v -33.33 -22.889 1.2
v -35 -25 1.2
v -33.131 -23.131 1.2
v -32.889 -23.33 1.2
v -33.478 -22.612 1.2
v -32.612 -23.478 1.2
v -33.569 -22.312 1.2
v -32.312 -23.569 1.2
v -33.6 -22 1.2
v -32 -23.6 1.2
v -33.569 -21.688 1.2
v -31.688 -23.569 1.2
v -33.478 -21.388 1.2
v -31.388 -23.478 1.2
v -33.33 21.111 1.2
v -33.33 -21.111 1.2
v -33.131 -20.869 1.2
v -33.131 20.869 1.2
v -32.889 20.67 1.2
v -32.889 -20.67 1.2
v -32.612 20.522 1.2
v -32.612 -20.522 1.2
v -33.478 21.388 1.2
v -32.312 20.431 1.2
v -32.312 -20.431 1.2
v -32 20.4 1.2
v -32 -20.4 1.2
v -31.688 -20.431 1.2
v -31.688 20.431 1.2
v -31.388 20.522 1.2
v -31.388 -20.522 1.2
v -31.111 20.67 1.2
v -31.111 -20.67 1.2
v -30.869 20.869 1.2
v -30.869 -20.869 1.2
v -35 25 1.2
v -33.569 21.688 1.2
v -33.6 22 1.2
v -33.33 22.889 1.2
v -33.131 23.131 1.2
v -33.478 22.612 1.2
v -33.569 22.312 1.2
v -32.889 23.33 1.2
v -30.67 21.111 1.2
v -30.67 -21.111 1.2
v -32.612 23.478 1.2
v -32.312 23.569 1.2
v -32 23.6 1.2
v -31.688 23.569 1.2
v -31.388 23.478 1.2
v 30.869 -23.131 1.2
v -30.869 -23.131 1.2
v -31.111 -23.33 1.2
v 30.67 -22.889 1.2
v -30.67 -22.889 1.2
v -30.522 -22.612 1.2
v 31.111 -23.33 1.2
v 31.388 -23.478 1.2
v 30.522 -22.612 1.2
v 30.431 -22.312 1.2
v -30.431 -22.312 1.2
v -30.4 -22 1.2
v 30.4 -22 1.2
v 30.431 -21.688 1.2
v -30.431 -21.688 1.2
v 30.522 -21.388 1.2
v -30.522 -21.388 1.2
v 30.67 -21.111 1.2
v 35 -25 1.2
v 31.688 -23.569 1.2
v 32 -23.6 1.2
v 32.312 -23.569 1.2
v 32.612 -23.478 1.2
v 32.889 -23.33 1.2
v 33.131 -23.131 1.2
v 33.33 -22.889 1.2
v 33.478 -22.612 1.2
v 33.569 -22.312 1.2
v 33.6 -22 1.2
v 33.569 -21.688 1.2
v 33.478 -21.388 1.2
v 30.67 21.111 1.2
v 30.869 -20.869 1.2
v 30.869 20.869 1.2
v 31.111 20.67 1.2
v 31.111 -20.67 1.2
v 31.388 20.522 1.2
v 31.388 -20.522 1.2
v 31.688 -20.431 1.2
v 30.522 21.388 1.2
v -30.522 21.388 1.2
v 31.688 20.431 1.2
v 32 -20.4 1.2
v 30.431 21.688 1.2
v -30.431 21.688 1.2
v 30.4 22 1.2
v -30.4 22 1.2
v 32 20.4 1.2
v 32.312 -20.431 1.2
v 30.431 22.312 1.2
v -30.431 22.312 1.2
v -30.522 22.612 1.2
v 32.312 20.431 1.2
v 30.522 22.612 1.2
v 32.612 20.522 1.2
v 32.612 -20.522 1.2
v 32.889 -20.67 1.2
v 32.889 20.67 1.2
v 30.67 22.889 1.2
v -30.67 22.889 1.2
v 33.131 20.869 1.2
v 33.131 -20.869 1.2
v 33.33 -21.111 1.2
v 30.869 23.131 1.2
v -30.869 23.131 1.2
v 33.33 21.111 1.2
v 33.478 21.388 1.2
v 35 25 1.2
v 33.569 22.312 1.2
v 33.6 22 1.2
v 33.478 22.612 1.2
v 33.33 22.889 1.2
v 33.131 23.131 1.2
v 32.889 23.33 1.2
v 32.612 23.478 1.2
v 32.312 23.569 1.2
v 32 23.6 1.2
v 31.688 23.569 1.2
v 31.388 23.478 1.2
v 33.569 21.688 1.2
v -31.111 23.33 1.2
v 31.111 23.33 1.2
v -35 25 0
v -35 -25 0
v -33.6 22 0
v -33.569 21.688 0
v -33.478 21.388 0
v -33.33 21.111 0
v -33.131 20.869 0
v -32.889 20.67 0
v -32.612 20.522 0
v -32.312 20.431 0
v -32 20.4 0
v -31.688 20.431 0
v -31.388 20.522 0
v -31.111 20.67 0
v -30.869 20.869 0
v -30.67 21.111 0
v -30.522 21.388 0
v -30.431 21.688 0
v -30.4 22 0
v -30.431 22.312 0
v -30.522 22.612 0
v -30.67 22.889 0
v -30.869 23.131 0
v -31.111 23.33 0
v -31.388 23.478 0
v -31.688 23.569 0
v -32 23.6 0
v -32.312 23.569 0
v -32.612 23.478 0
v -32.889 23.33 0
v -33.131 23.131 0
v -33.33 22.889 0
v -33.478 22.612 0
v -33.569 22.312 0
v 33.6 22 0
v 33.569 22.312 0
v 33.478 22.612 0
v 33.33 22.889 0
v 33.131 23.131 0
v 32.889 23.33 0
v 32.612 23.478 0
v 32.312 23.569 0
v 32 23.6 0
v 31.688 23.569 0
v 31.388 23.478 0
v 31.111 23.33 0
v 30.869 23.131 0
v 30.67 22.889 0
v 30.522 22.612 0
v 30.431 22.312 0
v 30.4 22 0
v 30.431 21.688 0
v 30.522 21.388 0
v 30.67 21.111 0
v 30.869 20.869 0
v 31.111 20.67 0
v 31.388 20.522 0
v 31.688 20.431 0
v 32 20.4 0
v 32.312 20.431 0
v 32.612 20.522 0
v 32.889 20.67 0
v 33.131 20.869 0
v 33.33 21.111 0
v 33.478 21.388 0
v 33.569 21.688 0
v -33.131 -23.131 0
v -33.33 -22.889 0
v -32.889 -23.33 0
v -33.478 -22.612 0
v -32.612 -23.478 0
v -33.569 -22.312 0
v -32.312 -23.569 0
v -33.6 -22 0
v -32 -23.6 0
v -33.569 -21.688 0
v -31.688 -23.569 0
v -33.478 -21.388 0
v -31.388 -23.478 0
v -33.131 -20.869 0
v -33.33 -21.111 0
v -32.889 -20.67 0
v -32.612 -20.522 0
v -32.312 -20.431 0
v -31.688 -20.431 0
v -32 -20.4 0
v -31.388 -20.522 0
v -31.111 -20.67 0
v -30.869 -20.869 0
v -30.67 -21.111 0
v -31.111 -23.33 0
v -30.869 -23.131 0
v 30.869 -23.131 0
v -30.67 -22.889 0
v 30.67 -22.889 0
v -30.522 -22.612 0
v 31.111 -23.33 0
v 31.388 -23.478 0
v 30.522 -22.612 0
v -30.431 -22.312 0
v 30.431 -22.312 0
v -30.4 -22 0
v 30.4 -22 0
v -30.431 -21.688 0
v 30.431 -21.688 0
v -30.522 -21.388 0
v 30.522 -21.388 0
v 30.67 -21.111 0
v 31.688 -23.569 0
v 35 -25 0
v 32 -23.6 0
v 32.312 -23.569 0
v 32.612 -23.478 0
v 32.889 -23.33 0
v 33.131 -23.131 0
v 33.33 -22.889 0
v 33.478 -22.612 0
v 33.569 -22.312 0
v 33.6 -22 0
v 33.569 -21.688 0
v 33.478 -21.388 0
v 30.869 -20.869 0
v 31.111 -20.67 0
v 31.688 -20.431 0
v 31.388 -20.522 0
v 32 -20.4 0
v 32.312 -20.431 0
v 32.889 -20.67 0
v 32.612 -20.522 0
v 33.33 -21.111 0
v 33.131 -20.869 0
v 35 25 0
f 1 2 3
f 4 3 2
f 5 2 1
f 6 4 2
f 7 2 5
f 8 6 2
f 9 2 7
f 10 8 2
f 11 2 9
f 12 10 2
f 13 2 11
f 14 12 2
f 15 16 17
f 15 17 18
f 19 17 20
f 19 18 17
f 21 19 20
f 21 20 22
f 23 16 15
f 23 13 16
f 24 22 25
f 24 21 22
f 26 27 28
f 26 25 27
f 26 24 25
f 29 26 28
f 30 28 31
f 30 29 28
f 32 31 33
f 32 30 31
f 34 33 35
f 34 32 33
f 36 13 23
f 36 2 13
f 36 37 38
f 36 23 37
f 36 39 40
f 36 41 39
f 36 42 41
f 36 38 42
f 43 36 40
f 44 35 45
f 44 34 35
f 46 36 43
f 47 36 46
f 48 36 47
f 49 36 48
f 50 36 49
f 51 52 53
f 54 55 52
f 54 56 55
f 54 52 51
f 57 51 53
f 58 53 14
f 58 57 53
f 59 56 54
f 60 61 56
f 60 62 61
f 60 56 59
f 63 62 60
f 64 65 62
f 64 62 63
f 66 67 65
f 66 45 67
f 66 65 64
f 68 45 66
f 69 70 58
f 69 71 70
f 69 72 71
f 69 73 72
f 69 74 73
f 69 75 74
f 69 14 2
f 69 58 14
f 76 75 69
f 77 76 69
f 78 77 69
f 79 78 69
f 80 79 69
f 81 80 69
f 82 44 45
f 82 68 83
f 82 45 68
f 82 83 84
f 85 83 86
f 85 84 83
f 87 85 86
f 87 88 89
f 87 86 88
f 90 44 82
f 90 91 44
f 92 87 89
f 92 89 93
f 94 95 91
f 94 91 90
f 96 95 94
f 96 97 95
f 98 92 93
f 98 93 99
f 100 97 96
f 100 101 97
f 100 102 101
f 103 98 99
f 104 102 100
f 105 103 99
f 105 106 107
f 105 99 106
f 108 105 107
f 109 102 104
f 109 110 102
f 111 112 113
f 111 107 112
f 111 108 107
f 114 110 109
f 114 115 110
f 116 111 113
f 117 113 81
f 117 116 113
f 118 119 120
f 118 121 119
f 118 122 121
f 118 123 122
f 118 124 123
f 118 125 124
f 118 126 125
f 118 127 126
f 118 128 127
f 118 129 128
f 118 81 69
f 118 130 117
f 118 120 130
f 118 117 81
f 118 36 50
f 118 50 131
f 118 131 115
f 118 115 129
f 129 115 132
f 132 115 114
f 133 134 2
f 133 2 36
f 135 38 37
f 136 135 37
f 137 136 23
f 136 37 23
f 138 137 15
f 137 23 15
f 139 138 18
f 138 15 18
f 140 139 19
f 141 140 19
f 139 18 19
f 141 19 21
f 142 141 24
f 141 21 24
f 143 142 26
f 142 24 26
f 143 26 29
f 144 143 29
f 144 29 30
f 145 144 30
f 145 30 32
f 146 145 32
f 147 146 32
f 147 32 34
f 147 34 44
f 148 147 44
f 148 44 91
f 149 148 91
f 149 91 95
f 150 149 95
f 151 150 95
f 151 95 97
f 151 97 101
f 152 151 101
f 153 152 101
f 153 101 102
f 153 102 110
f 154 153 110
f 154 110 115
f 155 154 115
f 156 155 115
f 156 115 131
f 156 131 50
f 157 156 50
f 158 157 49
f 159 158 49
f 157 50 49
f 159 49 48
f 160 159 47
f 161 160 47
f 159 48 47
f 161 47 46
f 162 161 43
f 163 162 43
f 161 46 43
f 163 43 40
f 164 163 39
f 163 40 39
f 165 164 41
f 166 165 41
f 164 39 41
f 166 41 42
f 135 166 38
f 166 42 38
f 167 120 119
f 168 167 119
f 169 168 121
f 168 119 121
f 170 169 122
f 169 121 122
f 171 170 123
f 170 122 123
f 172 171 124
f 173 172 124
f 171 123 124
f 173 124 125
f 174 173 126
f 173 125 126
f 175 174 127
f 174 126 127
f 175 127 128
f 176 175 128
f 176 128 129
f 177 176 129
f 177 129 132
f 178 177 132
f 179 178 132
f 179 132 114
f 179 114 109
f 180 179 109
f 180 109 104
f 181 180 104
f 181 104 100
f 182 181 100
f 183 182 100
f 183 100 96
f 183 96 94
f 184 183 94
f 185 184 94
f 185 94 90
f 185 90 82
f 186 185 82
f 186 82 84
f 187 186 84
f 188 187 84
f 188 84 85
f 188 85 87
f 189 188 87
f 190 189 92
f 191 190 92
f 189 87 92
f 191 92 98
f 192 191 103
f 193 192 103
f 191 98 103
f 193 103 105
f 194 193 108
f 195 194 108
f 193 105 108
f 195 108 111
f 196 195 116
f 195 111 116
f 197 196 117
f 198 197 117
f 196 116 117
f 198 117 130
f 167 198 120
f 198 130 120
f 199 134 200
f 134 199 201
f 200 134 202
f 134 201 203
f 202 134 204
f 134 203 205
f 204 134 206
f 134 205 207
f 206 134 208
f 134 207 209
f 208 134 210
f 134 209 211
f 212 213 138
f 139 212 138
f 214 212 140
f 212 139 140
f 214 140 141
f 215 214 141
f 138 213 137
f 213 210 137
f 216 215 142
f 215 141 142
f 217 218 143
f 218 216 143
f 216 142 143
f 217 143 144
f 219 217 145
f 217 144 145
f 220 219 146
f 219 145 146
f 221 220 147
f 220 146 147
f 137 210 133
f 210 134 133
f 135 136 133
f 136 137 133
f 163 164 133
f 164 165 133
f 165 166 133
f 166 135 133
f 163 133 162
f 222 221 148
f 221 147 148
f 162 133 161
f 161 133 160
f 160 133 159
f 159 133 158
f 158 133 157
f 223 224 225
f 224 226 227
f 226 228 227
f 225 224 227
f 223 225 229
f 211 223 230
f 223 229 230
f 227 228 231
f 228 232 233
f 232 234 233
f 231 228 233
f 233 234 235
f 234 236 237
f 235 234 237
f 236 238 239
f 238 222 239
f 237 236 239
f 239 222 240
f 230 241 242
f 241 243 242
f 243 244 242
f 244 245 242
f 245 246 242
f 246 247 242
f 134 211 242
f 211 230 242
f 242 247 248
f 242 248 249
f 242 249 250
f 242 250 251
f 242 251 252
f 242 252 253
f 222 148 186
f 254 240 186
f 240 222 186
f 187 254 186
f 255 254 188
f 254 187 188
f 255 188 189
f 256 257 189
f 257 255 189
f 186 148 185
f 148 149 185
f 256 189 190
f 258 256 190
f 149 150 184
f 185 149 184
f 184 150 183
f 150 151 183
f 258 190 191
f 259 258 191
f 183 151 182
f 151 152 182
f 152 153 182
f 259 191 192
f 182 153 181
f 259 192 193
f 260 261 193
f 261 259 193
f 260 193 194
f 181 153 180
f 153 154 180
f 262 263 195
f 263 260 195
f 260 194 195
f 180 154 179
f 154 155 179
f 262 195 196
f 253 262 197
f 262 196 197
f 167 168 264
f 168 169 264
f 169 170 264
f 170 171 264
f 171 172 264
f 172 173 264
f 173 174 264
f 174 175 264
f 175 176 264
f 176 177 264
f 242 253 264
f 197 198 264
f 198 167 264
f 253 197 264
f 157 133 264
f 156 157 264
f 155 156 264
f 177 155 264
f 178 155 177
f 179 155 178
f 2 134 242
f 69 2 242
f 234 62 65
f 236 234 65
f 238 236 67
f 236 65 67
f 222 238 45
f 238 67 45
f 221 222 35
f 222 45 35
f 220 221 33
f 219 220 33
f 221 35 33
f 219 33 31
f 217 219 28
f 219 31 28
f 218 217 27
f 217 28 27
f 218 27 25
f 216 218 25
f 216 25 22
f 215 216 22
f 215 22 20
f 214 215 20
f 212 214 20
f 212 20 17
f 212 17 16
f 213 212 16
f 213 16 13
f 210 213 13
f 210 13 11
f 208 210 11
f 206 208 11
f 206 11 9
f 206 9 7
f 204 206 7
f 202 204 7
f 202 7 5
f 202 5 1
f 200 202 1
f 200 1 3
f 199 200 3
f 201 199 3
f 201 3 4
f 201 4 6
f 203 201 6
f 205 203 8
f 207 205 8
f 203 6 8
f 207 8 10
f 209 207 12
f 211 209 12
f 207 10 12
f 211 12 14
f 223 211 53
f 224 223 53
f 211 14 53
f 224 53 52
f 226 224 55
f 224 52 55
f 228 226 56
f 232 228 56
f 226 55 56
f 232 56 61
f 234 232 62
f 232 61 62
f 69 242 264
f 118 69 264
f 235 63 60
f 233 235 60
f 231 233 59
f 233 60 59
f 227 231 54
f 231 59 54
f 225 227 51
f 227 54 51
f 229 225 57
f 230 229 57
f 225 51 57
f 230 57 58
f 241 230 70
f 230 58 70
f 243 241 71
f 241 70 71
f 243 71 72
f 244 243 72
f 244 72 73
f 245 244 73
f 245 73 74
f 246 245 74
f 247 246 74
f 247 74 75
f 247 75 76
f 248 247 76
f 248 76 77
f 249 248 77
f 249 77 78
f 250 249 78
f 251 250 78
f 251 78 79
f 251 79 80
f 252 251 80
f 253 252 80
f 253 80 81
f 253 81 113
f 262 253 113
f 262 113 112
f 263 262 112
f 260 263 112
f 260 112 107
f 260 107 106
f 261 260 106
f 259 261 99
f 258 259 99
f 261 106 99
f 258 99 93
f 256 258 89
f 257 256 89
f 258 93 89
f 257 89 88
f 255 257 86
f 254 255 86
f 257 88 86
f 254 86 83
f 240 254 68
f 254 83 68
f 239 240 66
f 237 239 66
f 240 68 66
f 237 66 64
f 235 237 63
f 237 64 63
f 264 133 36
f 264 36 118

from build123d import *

# Parameters (mm, degrees)
SKETCH1_W           = 70
SKETCH1_H           = 50
BOSS_EXTRUDE1_DEPTH = 1.2
CUT_EXTRUDE1_REACH  = 45.028
SKETCH6_R           = 1.6


with BuildPart() as part:
    # Sketch1 → Boss-Extrude1 (new body)
    with BuildSketch(Plane.XY):
        Rectangle(SKETCH1_W, SKETCH1_H)
    extrude(amount=BOSS_EXTRUDE1_DEPTH)

    # Sketch6 → Cut-Extrude1 (cut, up to next)
    with BuildSketch(Plane.XY.offset(1.2), mode=Mode.PRIVATE) as cut_extrude1_sk1:
        with Locations((-32, -22)):
            Circle(SKETCH6_R)
    cut_extrude1_tool1 = extrude(cut_extrude1_sk1.sketch, amount=-CUT_EXTRUDE1_REACH, mode=Mode.PRIVATE) & part.part
    # Sketch6 → Cut-Extrude1 (cut, up to next)
    with BuildSketch(Plane.XY.offset(1.2), mode=Mode.PRIVATE) as cut_extrude1_sk2:
        with Locations(Location((32, -22, 0), (0, 0, 180))):
            Circle(SKETCH6_R)
    cut_extrude1_tool2 = extrude(cut_extrude1_sk2.sketch, amount=-CUT_EXTRUDE1_REACH, mode=Mode.PRIVATE) & part.part
    # Sketch6 → Cut-Extrude1 (cut, up to next)
    with BuildSketch(Plane.XY.offset(1.2), mode=Mode.PRIVATE) as cut_extrude1_sk3:
        with Locations((32, 22)):
            Circle(SKETCH6_R)
    cut_extrude1_tool3 = extrude(cut_extrude1_sk3.sketch, amount=-CUT_EXTRUDE1_REACH, mode=Mode.PRIVATE) & part.part
    # Sketch6 → Cut-Extrude1 (cut, up to next)
    with BuildSketch(Plane.XY.offset(1.2), mode=Mode.PRIVATE) as cut_extrude1_sk4:
        with Locations(Location((-32, 22, 0), (0, 0, 180))):
            Circle(SKETCH6_R)
    cut_extrude1_tool4 = extrude(cut_extrude1_sk4.sketch, amount=-CUT_EXTRUDE1_REACH, mode=Mode.PRIVATE) & part.part
    add(cut_extrude1_tool1.solids().sort_by_distance((-32, -22, 1.2))[0], mode=Mode.SUBTRACT)
    add(cut_extrude1_tool2.solids().sort_by_distance((32, -22, 1.2))[0], mode=Mode.SUBTRACT)
    add(cut_extrude1_tool3.solids().sort_by_distance((32, 22, 1.2))[0], mode=Mode.SUBTRACT)
    add(cut_extrude1_tool4.solids().sort_by_distance((-32, 22, 1.2))[0], mode=Mode.SUBTRACT)


solid = part.part
